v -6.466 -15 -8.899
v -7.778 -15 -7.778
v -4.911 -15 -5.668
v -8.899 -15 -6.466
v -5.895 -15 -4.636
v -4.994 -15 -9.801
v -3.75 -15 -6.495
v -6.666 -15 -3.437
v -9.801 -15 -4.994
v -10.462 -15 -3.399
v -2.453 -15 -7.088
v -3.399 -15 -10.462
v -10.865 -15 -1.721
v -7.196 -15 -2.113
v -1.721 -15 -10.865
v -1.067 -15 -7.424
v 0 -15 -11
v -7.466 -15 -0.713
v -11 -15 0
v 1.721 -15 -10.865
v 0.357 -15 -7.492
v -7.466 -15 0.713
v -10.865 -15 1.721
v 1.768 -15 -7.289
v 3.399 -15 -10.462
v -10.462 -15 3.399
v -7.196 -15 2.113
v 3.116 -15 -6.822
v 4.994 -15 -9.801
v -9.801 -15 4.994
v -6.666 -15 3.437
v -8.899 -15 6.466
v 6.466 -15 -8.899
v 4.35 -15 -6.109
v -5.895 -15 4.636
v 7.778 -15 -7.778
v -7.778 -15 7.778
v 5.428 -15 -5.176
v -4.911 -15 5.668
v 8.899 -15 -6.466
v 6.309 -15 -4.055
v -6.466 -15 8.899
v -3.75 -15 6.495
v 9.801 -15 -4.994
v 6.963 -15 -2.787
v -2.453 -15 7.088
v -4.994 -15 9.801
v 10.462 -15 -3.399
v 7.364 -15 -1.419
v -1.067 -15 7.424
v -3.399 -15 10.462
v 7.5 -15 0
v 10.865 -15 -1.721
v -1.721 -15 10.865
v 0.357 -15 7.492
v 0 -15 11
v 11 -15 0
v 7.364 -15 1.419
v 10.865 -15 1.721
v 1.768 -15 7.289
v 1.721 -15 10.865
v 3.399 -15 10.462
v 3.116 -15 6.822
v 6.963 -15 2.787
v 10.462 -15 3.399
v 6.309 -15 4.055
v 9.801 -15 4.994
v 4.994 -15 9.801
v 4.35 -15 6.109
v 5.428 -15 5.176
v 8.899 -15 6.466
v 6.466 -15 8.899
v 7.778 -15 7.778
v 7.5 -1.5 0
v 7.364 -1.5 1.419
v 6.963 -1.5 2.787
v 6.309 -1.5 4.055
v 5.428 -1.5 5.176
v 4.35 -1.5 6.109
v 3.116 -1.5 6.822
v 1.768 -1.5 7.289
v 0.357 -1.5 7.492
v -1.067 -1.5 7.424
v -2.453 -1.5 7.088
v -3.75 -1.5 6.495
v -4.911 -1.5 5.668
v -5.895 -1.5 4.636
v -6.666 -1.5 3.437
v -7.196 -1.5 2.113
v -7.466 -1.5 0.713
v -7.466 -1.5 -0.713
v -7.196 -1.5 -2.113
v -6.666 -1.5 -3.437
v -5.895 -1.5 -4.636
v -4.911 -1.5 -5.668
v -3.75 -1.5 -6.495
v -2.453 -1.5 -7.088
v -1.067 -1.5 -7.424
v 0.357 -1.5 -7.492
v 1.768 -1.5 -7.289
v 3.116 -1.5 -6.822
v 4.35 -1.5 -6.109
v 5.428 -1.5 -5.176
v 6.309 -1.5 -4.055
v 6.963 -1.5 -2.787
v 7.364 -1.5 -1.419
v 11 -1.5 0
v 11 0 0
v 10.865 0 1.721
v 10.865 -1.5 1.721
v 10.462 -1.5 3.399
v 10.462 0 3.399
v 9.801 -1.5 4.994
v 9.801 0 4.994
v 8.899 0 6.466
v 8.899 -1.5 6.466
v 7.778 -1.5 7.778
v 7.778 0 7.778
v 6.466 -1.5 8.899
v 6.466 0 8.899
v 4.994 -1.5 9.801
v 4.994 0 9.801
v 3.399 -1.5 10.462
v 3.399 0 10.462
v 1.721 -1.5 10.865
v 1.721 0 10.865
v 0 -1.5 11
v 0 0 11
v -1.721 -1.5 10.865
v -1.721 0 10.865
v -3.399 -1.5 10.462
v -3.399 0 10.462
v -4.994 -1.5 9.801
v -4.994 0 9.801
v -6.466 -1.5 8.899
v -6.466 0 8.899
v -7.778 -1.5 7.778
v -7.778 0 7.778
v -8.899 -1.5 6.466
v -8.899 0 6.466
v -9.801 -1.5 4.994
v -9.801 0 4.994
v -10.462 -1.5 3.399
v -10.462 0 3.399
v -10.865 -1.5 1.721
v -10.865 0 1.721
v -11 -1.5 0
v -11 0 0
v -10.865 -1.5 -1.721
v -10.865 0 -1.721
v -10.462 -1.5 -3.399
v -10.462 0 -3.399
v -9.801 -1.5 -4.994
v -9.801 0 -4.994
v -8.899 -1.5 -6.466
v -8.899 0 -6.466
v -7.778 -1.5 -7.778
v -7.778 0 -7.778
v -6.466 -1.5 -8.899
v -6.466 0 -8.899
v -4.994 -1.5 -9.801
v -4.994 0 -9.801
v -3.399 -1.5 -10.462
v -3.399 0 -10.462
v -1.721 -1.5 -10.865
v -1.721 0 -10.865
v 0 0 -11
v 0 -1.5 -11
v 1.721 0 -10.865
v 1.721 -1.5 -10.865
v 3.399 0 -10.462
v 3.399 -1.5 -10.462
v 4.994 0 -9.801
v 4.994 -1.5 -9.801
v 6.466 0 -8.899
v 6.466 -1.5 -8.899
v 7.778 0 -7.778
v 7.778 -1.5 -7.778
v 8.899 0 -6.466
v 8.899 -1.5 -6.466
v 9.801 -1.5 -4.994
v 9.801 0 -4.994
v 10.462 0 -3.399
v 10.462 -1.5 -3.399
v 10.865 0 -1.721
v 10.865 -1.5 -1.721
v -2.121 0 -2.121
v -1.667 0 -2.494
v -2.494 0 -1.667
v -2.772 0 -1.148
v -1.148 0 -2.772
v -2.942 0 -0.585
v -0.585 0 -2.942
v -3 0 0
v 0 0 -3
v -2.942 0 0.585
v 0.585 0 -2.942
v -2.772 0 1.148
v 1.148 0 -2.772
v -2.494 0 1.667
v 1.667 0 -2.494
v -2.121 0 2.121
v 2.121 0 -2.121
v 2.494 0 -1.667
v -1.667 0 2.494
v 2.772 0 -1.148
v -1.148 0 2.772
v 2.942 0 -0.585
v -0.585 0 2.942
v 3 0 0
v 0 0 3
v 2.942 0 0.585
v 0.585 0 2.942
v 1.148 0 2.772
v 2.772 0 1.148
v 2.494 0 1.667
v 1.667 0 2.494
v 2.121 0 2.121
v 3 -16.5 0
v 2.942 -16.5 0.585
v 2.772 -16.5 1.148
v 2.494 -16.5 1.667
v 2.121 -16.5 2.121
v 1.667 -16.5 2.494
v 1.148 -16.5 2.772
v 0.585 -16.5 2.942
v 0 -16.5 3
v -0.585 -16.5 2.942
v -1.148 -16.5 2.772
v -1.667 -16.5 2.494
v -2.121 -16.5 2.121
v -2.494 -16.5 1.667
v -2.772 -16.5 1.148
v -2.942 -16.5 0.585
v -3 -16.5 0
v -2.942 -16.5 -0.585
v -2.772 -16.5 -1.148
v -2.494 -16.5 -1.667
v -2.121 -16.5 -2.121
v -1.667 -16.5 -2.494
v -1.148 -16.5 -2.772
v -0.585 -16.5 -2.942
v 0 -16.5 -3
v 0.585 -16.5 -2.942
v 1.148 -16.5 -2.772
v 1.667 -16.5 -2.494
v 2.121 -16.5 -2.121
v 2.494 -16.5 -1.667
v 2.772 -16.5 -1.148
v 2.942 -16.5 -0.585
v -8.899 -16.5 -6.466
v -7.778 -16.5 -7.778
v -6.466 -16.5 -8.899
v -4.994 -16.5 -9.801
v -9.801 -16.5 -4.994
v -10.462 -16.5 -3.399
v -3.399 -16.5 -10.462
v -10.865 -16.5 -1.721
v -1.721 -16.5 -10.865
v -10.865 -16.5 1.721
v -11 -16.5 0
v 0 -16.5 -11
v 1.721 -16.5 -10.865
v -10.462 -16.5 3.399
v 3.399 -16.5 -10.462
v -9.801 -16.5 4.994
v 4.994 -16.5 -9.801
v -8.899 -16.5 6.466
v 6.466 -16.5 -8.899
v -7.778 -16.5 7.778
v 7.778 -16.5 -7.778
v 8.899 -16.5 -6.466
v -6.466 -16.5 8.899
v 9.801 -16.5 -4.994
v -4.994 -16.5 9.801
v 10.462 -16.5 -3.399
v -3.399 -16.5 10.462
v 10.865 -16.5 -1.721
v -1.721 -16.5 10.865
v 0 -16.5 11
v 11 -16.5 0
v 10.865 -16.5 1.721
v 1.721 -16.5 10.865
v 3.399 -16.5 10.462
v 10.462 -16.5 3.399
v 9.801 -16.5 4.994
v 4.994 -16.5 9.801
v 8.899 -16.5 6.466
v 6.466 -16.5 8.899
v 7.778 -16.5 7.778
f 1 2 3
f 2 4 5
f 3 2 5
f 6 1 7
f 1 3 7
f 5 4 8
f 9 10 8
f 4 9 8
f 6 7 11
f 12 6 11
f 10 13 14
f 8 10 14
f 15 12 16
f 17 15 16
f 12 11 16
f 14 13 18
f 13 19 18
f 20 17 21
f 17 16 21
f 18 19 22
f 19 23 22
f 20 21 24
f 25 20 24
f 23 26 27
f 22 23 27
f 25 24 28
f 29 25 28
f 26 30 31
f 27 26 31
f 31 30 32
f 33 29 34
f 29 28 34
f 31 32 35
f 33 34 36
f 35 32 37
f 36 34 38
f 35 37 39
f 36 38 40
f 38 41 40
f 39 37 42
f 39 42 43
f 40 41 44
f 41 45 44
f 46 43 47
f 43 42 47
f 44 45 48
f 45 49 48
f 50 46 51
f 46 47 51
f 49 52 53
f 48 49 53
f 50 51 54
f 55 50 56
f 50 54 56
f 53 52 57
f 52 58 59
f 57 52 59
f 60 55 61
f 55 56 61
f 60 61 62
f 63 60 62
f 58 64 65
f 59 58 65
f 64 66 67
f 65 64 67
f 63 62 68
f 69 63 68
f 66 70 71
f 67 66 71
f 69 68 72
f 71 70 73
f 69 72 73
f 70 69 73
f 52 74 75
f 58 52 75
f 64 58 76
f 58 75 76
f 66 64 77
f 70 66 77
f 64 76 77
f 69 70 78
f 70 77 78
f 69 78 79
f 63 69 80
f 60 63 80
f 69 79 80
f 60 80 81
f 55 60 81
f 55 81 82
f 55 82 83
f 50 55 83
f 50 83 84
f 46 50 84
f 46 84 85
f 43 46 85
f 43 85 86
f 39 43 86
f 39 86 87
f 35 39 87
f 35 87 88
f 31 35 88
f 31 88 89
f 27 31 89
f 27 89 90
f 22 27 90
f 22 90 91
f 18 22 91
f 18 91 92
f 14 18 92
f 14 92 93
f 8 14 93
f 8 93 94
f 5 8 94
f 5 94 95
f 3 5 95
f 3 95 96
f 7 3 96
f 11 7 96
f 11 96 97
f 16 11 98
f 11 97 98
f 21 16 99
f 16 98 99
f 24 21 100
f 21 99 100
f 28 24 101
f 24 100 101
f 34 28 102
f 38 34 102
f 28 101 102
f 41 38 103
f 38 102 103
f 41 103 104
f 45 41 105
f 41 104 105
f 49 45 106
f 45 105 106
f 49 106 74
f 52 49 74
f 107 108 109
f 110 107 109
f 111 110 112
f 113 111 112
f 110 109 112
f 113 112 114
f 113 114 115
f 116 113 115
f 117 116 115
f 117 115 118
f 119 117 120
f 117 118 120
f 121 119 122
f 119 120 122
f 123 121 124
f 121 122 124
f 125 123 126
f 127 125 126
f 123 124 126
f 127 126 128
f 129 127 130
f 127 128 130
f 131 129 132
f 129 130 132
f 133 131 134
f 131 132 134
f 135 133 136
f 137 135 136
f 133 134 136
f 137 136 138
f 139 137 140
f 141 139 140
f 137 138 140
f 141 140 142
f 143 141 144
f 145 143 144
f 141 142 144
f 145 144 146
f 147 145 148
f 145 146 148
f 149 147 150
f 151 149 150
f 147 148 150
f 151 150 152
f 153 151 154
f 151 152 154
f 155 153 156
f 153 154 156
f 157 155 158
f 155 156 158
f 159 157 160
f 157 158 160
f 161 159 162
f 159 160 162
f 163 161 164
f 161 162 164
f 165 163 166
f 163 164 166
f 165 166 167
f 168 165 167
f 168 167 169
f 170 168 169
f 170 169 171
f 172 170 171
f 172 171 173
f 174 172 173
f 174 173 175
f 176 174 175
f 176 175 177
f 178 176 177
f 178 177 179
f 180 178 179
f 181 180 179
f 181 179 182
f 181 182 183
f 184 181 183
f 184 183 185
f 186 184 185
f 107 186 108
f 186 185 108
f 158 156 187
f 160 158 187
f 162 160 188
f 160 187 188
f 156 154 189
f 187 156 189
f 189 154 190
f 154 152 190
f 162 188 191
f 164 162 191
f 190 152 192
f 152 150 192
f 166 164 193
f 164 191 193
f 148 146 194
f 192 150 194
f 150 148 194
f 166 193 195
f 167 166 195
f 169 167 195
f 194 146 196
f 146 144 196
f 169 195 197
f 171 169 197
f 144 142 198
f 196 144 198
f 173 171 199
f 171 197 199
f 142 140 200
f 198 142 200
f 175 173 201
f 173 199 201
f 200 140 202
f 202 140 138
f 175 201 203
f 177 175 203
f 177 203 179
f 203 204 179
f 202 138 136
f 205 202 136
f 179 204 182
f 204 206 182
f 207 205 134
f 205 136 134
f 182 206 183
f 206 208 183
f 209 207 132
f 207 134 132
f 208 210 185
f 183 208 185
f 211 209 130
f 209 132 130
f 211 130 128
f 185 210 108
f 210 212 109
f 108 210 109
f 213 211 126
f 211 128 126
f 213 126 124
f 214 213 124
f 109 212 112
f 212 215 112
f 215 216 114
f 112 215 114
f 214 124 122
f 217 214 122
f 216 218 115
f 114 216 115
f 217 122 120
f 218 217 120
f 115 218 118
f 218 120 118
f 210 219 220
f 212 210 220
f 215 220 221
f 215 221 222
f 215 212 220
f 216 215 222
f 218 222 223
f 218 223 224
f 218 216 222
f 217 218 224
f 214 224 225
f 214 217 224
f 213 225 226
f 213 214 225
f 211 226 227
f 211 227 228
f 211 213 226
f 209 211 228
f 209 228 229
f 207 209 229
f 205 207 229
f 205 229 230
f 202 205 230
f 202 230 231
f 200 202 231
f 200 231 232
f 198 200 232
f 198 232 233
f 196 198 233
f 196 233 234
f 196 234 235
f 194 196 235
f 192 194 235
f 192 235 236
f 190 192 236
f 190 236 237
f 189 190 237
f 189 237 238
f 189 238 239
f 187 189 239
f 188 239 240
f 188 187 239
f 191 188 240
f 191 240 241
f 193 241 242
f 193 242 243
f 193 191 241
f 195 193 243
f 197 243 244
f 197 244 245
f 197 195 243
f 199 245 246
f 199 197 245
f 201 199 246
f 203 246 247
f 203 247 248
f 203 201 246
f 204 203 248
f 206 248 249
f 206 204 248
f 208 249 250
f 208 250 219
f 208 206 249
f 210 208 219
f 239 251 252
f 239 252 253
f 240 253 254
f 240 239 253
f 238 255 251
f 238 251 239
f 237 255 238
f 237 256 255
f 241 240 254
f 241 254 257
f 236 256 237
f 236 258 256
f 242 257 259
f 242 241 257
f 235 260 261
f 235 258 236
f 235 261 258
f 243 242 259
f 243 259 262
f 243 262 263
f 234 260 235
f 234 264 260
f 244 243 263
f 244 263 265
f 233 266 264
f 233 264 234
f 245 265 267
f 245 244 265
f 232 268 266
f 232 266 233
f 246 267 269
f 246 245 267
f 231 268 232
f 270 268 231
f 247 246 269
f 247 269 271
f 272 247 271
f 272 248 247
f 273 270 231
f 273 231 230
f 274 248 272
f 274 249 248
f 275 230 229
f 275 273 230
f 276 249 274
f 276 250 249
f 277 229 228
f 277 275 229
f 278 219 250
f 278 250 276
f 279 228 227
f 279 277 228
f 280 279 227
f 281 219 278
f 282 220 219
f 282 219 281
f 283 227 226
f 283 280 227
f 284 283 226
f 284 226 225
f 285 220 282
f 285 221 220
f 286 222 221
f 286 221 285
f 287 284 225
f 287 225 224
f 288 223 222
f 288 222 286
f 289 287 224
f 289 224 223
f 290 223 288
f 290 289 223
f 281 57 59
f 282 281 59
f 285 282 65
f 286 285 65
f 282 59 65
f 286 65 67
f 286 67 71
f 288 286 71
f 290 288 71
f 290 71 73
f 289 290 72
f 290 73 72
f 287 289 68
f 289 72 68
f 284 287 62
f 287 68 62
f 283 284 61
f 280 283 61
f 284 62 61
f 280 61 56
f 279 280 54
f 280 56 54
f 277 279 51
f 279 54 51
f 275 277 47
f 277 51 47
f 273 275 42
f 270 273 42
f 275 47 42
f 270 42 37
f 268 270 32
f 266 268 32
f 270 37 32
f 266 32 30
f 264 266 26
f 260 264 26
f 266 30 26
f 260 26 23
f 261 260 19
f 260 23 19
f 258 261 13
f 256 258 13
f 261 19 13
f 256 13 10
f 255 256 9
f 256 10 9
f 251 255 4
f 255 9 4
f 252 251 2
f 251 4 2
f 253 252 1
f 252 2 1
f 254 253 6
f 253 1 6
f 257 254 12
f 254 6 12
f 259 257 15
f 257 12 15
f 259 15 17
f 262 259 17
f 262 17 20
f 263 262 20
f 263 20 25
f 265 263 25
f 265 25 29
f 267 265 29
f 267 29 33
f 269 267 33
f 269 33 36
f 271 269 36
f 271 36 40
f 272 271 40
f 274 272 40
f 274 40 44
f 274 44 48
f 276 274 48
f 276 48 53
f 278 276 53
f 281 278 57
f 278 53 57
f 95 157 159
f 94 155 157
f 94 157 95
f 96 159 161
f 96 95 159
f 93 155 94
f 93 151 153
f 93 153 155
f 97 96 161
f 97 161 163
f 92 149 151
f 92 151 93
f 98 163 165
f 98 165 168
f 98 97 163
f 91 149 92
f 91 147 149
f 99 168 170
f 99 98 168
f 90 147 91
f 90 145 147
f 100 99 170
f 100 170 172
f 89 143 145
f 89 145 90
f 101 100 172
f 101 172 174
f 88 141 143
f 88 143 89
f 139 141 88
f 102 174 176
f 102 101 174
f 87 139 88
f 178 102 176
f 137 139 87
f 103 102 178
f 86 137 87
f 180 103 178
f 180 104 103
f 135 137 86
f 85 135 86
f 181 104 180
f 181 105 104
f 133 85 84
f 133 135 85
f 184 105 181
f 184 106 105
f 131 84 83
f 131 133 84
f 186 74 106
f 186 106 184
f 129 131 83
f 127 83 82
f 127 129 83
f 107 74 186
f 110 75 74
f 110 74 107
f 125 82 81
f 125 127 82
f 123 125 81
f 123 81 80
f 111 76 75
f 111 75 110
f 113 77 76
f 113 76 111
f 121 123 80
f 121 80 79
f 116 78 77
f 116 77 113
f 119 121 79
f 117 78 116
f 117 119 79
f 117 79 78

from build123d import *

# Parameters (mm, degrees)
F0_R        = 7.5
F0_R_2      = 3
F1_DEPTH    = 15
F0_R_3      = 11
F1_FACE_R   = 7.5
F1_FACE_R_2 = 3
F2_DEPTH    = 1.5
F3_START    = 13.5
F2_FACE_R   = 11
F2_FACE_R_2 = 7.5
F3_DEPTH    = 1.5


with BuildPart() as f1:
    # F0 (on Front) → F1 (new body)
    with BuildSketch(Plane.XZ):
        Circle(F0_R)
        Circle(F0_R_2, mode=Mode.SUBTRACT)
    extrude(amount=F1_DEPTH)

    # F0 (on Front) + F1_face (on face) → F2 (join)
    with BuildSketch(Plane.XZ):
        Circle(F0_R_3)
        Circle(F0_R, mode=Mode.SUBTRACT)
    with BuildSketch(Plane.XZ.offset(15)):
        Circle(F1_FACE_R)
        Circle(F1_FACE_R_2, mode=Mode.SUBTRACT)
    extrude(amount=F2_DEPTH)

    # F2_face (on face) → F3 (join)
    with BuildSketch(Plane.XZ.offset(1.5).offset(F3_START)):
        Circle(F2_FACE_R)
        Circle(F2_FACE_R_2, mode=Mode.SUBTRACT)
    extrude(amount=F3_DEPTH)


solid = f1.part
